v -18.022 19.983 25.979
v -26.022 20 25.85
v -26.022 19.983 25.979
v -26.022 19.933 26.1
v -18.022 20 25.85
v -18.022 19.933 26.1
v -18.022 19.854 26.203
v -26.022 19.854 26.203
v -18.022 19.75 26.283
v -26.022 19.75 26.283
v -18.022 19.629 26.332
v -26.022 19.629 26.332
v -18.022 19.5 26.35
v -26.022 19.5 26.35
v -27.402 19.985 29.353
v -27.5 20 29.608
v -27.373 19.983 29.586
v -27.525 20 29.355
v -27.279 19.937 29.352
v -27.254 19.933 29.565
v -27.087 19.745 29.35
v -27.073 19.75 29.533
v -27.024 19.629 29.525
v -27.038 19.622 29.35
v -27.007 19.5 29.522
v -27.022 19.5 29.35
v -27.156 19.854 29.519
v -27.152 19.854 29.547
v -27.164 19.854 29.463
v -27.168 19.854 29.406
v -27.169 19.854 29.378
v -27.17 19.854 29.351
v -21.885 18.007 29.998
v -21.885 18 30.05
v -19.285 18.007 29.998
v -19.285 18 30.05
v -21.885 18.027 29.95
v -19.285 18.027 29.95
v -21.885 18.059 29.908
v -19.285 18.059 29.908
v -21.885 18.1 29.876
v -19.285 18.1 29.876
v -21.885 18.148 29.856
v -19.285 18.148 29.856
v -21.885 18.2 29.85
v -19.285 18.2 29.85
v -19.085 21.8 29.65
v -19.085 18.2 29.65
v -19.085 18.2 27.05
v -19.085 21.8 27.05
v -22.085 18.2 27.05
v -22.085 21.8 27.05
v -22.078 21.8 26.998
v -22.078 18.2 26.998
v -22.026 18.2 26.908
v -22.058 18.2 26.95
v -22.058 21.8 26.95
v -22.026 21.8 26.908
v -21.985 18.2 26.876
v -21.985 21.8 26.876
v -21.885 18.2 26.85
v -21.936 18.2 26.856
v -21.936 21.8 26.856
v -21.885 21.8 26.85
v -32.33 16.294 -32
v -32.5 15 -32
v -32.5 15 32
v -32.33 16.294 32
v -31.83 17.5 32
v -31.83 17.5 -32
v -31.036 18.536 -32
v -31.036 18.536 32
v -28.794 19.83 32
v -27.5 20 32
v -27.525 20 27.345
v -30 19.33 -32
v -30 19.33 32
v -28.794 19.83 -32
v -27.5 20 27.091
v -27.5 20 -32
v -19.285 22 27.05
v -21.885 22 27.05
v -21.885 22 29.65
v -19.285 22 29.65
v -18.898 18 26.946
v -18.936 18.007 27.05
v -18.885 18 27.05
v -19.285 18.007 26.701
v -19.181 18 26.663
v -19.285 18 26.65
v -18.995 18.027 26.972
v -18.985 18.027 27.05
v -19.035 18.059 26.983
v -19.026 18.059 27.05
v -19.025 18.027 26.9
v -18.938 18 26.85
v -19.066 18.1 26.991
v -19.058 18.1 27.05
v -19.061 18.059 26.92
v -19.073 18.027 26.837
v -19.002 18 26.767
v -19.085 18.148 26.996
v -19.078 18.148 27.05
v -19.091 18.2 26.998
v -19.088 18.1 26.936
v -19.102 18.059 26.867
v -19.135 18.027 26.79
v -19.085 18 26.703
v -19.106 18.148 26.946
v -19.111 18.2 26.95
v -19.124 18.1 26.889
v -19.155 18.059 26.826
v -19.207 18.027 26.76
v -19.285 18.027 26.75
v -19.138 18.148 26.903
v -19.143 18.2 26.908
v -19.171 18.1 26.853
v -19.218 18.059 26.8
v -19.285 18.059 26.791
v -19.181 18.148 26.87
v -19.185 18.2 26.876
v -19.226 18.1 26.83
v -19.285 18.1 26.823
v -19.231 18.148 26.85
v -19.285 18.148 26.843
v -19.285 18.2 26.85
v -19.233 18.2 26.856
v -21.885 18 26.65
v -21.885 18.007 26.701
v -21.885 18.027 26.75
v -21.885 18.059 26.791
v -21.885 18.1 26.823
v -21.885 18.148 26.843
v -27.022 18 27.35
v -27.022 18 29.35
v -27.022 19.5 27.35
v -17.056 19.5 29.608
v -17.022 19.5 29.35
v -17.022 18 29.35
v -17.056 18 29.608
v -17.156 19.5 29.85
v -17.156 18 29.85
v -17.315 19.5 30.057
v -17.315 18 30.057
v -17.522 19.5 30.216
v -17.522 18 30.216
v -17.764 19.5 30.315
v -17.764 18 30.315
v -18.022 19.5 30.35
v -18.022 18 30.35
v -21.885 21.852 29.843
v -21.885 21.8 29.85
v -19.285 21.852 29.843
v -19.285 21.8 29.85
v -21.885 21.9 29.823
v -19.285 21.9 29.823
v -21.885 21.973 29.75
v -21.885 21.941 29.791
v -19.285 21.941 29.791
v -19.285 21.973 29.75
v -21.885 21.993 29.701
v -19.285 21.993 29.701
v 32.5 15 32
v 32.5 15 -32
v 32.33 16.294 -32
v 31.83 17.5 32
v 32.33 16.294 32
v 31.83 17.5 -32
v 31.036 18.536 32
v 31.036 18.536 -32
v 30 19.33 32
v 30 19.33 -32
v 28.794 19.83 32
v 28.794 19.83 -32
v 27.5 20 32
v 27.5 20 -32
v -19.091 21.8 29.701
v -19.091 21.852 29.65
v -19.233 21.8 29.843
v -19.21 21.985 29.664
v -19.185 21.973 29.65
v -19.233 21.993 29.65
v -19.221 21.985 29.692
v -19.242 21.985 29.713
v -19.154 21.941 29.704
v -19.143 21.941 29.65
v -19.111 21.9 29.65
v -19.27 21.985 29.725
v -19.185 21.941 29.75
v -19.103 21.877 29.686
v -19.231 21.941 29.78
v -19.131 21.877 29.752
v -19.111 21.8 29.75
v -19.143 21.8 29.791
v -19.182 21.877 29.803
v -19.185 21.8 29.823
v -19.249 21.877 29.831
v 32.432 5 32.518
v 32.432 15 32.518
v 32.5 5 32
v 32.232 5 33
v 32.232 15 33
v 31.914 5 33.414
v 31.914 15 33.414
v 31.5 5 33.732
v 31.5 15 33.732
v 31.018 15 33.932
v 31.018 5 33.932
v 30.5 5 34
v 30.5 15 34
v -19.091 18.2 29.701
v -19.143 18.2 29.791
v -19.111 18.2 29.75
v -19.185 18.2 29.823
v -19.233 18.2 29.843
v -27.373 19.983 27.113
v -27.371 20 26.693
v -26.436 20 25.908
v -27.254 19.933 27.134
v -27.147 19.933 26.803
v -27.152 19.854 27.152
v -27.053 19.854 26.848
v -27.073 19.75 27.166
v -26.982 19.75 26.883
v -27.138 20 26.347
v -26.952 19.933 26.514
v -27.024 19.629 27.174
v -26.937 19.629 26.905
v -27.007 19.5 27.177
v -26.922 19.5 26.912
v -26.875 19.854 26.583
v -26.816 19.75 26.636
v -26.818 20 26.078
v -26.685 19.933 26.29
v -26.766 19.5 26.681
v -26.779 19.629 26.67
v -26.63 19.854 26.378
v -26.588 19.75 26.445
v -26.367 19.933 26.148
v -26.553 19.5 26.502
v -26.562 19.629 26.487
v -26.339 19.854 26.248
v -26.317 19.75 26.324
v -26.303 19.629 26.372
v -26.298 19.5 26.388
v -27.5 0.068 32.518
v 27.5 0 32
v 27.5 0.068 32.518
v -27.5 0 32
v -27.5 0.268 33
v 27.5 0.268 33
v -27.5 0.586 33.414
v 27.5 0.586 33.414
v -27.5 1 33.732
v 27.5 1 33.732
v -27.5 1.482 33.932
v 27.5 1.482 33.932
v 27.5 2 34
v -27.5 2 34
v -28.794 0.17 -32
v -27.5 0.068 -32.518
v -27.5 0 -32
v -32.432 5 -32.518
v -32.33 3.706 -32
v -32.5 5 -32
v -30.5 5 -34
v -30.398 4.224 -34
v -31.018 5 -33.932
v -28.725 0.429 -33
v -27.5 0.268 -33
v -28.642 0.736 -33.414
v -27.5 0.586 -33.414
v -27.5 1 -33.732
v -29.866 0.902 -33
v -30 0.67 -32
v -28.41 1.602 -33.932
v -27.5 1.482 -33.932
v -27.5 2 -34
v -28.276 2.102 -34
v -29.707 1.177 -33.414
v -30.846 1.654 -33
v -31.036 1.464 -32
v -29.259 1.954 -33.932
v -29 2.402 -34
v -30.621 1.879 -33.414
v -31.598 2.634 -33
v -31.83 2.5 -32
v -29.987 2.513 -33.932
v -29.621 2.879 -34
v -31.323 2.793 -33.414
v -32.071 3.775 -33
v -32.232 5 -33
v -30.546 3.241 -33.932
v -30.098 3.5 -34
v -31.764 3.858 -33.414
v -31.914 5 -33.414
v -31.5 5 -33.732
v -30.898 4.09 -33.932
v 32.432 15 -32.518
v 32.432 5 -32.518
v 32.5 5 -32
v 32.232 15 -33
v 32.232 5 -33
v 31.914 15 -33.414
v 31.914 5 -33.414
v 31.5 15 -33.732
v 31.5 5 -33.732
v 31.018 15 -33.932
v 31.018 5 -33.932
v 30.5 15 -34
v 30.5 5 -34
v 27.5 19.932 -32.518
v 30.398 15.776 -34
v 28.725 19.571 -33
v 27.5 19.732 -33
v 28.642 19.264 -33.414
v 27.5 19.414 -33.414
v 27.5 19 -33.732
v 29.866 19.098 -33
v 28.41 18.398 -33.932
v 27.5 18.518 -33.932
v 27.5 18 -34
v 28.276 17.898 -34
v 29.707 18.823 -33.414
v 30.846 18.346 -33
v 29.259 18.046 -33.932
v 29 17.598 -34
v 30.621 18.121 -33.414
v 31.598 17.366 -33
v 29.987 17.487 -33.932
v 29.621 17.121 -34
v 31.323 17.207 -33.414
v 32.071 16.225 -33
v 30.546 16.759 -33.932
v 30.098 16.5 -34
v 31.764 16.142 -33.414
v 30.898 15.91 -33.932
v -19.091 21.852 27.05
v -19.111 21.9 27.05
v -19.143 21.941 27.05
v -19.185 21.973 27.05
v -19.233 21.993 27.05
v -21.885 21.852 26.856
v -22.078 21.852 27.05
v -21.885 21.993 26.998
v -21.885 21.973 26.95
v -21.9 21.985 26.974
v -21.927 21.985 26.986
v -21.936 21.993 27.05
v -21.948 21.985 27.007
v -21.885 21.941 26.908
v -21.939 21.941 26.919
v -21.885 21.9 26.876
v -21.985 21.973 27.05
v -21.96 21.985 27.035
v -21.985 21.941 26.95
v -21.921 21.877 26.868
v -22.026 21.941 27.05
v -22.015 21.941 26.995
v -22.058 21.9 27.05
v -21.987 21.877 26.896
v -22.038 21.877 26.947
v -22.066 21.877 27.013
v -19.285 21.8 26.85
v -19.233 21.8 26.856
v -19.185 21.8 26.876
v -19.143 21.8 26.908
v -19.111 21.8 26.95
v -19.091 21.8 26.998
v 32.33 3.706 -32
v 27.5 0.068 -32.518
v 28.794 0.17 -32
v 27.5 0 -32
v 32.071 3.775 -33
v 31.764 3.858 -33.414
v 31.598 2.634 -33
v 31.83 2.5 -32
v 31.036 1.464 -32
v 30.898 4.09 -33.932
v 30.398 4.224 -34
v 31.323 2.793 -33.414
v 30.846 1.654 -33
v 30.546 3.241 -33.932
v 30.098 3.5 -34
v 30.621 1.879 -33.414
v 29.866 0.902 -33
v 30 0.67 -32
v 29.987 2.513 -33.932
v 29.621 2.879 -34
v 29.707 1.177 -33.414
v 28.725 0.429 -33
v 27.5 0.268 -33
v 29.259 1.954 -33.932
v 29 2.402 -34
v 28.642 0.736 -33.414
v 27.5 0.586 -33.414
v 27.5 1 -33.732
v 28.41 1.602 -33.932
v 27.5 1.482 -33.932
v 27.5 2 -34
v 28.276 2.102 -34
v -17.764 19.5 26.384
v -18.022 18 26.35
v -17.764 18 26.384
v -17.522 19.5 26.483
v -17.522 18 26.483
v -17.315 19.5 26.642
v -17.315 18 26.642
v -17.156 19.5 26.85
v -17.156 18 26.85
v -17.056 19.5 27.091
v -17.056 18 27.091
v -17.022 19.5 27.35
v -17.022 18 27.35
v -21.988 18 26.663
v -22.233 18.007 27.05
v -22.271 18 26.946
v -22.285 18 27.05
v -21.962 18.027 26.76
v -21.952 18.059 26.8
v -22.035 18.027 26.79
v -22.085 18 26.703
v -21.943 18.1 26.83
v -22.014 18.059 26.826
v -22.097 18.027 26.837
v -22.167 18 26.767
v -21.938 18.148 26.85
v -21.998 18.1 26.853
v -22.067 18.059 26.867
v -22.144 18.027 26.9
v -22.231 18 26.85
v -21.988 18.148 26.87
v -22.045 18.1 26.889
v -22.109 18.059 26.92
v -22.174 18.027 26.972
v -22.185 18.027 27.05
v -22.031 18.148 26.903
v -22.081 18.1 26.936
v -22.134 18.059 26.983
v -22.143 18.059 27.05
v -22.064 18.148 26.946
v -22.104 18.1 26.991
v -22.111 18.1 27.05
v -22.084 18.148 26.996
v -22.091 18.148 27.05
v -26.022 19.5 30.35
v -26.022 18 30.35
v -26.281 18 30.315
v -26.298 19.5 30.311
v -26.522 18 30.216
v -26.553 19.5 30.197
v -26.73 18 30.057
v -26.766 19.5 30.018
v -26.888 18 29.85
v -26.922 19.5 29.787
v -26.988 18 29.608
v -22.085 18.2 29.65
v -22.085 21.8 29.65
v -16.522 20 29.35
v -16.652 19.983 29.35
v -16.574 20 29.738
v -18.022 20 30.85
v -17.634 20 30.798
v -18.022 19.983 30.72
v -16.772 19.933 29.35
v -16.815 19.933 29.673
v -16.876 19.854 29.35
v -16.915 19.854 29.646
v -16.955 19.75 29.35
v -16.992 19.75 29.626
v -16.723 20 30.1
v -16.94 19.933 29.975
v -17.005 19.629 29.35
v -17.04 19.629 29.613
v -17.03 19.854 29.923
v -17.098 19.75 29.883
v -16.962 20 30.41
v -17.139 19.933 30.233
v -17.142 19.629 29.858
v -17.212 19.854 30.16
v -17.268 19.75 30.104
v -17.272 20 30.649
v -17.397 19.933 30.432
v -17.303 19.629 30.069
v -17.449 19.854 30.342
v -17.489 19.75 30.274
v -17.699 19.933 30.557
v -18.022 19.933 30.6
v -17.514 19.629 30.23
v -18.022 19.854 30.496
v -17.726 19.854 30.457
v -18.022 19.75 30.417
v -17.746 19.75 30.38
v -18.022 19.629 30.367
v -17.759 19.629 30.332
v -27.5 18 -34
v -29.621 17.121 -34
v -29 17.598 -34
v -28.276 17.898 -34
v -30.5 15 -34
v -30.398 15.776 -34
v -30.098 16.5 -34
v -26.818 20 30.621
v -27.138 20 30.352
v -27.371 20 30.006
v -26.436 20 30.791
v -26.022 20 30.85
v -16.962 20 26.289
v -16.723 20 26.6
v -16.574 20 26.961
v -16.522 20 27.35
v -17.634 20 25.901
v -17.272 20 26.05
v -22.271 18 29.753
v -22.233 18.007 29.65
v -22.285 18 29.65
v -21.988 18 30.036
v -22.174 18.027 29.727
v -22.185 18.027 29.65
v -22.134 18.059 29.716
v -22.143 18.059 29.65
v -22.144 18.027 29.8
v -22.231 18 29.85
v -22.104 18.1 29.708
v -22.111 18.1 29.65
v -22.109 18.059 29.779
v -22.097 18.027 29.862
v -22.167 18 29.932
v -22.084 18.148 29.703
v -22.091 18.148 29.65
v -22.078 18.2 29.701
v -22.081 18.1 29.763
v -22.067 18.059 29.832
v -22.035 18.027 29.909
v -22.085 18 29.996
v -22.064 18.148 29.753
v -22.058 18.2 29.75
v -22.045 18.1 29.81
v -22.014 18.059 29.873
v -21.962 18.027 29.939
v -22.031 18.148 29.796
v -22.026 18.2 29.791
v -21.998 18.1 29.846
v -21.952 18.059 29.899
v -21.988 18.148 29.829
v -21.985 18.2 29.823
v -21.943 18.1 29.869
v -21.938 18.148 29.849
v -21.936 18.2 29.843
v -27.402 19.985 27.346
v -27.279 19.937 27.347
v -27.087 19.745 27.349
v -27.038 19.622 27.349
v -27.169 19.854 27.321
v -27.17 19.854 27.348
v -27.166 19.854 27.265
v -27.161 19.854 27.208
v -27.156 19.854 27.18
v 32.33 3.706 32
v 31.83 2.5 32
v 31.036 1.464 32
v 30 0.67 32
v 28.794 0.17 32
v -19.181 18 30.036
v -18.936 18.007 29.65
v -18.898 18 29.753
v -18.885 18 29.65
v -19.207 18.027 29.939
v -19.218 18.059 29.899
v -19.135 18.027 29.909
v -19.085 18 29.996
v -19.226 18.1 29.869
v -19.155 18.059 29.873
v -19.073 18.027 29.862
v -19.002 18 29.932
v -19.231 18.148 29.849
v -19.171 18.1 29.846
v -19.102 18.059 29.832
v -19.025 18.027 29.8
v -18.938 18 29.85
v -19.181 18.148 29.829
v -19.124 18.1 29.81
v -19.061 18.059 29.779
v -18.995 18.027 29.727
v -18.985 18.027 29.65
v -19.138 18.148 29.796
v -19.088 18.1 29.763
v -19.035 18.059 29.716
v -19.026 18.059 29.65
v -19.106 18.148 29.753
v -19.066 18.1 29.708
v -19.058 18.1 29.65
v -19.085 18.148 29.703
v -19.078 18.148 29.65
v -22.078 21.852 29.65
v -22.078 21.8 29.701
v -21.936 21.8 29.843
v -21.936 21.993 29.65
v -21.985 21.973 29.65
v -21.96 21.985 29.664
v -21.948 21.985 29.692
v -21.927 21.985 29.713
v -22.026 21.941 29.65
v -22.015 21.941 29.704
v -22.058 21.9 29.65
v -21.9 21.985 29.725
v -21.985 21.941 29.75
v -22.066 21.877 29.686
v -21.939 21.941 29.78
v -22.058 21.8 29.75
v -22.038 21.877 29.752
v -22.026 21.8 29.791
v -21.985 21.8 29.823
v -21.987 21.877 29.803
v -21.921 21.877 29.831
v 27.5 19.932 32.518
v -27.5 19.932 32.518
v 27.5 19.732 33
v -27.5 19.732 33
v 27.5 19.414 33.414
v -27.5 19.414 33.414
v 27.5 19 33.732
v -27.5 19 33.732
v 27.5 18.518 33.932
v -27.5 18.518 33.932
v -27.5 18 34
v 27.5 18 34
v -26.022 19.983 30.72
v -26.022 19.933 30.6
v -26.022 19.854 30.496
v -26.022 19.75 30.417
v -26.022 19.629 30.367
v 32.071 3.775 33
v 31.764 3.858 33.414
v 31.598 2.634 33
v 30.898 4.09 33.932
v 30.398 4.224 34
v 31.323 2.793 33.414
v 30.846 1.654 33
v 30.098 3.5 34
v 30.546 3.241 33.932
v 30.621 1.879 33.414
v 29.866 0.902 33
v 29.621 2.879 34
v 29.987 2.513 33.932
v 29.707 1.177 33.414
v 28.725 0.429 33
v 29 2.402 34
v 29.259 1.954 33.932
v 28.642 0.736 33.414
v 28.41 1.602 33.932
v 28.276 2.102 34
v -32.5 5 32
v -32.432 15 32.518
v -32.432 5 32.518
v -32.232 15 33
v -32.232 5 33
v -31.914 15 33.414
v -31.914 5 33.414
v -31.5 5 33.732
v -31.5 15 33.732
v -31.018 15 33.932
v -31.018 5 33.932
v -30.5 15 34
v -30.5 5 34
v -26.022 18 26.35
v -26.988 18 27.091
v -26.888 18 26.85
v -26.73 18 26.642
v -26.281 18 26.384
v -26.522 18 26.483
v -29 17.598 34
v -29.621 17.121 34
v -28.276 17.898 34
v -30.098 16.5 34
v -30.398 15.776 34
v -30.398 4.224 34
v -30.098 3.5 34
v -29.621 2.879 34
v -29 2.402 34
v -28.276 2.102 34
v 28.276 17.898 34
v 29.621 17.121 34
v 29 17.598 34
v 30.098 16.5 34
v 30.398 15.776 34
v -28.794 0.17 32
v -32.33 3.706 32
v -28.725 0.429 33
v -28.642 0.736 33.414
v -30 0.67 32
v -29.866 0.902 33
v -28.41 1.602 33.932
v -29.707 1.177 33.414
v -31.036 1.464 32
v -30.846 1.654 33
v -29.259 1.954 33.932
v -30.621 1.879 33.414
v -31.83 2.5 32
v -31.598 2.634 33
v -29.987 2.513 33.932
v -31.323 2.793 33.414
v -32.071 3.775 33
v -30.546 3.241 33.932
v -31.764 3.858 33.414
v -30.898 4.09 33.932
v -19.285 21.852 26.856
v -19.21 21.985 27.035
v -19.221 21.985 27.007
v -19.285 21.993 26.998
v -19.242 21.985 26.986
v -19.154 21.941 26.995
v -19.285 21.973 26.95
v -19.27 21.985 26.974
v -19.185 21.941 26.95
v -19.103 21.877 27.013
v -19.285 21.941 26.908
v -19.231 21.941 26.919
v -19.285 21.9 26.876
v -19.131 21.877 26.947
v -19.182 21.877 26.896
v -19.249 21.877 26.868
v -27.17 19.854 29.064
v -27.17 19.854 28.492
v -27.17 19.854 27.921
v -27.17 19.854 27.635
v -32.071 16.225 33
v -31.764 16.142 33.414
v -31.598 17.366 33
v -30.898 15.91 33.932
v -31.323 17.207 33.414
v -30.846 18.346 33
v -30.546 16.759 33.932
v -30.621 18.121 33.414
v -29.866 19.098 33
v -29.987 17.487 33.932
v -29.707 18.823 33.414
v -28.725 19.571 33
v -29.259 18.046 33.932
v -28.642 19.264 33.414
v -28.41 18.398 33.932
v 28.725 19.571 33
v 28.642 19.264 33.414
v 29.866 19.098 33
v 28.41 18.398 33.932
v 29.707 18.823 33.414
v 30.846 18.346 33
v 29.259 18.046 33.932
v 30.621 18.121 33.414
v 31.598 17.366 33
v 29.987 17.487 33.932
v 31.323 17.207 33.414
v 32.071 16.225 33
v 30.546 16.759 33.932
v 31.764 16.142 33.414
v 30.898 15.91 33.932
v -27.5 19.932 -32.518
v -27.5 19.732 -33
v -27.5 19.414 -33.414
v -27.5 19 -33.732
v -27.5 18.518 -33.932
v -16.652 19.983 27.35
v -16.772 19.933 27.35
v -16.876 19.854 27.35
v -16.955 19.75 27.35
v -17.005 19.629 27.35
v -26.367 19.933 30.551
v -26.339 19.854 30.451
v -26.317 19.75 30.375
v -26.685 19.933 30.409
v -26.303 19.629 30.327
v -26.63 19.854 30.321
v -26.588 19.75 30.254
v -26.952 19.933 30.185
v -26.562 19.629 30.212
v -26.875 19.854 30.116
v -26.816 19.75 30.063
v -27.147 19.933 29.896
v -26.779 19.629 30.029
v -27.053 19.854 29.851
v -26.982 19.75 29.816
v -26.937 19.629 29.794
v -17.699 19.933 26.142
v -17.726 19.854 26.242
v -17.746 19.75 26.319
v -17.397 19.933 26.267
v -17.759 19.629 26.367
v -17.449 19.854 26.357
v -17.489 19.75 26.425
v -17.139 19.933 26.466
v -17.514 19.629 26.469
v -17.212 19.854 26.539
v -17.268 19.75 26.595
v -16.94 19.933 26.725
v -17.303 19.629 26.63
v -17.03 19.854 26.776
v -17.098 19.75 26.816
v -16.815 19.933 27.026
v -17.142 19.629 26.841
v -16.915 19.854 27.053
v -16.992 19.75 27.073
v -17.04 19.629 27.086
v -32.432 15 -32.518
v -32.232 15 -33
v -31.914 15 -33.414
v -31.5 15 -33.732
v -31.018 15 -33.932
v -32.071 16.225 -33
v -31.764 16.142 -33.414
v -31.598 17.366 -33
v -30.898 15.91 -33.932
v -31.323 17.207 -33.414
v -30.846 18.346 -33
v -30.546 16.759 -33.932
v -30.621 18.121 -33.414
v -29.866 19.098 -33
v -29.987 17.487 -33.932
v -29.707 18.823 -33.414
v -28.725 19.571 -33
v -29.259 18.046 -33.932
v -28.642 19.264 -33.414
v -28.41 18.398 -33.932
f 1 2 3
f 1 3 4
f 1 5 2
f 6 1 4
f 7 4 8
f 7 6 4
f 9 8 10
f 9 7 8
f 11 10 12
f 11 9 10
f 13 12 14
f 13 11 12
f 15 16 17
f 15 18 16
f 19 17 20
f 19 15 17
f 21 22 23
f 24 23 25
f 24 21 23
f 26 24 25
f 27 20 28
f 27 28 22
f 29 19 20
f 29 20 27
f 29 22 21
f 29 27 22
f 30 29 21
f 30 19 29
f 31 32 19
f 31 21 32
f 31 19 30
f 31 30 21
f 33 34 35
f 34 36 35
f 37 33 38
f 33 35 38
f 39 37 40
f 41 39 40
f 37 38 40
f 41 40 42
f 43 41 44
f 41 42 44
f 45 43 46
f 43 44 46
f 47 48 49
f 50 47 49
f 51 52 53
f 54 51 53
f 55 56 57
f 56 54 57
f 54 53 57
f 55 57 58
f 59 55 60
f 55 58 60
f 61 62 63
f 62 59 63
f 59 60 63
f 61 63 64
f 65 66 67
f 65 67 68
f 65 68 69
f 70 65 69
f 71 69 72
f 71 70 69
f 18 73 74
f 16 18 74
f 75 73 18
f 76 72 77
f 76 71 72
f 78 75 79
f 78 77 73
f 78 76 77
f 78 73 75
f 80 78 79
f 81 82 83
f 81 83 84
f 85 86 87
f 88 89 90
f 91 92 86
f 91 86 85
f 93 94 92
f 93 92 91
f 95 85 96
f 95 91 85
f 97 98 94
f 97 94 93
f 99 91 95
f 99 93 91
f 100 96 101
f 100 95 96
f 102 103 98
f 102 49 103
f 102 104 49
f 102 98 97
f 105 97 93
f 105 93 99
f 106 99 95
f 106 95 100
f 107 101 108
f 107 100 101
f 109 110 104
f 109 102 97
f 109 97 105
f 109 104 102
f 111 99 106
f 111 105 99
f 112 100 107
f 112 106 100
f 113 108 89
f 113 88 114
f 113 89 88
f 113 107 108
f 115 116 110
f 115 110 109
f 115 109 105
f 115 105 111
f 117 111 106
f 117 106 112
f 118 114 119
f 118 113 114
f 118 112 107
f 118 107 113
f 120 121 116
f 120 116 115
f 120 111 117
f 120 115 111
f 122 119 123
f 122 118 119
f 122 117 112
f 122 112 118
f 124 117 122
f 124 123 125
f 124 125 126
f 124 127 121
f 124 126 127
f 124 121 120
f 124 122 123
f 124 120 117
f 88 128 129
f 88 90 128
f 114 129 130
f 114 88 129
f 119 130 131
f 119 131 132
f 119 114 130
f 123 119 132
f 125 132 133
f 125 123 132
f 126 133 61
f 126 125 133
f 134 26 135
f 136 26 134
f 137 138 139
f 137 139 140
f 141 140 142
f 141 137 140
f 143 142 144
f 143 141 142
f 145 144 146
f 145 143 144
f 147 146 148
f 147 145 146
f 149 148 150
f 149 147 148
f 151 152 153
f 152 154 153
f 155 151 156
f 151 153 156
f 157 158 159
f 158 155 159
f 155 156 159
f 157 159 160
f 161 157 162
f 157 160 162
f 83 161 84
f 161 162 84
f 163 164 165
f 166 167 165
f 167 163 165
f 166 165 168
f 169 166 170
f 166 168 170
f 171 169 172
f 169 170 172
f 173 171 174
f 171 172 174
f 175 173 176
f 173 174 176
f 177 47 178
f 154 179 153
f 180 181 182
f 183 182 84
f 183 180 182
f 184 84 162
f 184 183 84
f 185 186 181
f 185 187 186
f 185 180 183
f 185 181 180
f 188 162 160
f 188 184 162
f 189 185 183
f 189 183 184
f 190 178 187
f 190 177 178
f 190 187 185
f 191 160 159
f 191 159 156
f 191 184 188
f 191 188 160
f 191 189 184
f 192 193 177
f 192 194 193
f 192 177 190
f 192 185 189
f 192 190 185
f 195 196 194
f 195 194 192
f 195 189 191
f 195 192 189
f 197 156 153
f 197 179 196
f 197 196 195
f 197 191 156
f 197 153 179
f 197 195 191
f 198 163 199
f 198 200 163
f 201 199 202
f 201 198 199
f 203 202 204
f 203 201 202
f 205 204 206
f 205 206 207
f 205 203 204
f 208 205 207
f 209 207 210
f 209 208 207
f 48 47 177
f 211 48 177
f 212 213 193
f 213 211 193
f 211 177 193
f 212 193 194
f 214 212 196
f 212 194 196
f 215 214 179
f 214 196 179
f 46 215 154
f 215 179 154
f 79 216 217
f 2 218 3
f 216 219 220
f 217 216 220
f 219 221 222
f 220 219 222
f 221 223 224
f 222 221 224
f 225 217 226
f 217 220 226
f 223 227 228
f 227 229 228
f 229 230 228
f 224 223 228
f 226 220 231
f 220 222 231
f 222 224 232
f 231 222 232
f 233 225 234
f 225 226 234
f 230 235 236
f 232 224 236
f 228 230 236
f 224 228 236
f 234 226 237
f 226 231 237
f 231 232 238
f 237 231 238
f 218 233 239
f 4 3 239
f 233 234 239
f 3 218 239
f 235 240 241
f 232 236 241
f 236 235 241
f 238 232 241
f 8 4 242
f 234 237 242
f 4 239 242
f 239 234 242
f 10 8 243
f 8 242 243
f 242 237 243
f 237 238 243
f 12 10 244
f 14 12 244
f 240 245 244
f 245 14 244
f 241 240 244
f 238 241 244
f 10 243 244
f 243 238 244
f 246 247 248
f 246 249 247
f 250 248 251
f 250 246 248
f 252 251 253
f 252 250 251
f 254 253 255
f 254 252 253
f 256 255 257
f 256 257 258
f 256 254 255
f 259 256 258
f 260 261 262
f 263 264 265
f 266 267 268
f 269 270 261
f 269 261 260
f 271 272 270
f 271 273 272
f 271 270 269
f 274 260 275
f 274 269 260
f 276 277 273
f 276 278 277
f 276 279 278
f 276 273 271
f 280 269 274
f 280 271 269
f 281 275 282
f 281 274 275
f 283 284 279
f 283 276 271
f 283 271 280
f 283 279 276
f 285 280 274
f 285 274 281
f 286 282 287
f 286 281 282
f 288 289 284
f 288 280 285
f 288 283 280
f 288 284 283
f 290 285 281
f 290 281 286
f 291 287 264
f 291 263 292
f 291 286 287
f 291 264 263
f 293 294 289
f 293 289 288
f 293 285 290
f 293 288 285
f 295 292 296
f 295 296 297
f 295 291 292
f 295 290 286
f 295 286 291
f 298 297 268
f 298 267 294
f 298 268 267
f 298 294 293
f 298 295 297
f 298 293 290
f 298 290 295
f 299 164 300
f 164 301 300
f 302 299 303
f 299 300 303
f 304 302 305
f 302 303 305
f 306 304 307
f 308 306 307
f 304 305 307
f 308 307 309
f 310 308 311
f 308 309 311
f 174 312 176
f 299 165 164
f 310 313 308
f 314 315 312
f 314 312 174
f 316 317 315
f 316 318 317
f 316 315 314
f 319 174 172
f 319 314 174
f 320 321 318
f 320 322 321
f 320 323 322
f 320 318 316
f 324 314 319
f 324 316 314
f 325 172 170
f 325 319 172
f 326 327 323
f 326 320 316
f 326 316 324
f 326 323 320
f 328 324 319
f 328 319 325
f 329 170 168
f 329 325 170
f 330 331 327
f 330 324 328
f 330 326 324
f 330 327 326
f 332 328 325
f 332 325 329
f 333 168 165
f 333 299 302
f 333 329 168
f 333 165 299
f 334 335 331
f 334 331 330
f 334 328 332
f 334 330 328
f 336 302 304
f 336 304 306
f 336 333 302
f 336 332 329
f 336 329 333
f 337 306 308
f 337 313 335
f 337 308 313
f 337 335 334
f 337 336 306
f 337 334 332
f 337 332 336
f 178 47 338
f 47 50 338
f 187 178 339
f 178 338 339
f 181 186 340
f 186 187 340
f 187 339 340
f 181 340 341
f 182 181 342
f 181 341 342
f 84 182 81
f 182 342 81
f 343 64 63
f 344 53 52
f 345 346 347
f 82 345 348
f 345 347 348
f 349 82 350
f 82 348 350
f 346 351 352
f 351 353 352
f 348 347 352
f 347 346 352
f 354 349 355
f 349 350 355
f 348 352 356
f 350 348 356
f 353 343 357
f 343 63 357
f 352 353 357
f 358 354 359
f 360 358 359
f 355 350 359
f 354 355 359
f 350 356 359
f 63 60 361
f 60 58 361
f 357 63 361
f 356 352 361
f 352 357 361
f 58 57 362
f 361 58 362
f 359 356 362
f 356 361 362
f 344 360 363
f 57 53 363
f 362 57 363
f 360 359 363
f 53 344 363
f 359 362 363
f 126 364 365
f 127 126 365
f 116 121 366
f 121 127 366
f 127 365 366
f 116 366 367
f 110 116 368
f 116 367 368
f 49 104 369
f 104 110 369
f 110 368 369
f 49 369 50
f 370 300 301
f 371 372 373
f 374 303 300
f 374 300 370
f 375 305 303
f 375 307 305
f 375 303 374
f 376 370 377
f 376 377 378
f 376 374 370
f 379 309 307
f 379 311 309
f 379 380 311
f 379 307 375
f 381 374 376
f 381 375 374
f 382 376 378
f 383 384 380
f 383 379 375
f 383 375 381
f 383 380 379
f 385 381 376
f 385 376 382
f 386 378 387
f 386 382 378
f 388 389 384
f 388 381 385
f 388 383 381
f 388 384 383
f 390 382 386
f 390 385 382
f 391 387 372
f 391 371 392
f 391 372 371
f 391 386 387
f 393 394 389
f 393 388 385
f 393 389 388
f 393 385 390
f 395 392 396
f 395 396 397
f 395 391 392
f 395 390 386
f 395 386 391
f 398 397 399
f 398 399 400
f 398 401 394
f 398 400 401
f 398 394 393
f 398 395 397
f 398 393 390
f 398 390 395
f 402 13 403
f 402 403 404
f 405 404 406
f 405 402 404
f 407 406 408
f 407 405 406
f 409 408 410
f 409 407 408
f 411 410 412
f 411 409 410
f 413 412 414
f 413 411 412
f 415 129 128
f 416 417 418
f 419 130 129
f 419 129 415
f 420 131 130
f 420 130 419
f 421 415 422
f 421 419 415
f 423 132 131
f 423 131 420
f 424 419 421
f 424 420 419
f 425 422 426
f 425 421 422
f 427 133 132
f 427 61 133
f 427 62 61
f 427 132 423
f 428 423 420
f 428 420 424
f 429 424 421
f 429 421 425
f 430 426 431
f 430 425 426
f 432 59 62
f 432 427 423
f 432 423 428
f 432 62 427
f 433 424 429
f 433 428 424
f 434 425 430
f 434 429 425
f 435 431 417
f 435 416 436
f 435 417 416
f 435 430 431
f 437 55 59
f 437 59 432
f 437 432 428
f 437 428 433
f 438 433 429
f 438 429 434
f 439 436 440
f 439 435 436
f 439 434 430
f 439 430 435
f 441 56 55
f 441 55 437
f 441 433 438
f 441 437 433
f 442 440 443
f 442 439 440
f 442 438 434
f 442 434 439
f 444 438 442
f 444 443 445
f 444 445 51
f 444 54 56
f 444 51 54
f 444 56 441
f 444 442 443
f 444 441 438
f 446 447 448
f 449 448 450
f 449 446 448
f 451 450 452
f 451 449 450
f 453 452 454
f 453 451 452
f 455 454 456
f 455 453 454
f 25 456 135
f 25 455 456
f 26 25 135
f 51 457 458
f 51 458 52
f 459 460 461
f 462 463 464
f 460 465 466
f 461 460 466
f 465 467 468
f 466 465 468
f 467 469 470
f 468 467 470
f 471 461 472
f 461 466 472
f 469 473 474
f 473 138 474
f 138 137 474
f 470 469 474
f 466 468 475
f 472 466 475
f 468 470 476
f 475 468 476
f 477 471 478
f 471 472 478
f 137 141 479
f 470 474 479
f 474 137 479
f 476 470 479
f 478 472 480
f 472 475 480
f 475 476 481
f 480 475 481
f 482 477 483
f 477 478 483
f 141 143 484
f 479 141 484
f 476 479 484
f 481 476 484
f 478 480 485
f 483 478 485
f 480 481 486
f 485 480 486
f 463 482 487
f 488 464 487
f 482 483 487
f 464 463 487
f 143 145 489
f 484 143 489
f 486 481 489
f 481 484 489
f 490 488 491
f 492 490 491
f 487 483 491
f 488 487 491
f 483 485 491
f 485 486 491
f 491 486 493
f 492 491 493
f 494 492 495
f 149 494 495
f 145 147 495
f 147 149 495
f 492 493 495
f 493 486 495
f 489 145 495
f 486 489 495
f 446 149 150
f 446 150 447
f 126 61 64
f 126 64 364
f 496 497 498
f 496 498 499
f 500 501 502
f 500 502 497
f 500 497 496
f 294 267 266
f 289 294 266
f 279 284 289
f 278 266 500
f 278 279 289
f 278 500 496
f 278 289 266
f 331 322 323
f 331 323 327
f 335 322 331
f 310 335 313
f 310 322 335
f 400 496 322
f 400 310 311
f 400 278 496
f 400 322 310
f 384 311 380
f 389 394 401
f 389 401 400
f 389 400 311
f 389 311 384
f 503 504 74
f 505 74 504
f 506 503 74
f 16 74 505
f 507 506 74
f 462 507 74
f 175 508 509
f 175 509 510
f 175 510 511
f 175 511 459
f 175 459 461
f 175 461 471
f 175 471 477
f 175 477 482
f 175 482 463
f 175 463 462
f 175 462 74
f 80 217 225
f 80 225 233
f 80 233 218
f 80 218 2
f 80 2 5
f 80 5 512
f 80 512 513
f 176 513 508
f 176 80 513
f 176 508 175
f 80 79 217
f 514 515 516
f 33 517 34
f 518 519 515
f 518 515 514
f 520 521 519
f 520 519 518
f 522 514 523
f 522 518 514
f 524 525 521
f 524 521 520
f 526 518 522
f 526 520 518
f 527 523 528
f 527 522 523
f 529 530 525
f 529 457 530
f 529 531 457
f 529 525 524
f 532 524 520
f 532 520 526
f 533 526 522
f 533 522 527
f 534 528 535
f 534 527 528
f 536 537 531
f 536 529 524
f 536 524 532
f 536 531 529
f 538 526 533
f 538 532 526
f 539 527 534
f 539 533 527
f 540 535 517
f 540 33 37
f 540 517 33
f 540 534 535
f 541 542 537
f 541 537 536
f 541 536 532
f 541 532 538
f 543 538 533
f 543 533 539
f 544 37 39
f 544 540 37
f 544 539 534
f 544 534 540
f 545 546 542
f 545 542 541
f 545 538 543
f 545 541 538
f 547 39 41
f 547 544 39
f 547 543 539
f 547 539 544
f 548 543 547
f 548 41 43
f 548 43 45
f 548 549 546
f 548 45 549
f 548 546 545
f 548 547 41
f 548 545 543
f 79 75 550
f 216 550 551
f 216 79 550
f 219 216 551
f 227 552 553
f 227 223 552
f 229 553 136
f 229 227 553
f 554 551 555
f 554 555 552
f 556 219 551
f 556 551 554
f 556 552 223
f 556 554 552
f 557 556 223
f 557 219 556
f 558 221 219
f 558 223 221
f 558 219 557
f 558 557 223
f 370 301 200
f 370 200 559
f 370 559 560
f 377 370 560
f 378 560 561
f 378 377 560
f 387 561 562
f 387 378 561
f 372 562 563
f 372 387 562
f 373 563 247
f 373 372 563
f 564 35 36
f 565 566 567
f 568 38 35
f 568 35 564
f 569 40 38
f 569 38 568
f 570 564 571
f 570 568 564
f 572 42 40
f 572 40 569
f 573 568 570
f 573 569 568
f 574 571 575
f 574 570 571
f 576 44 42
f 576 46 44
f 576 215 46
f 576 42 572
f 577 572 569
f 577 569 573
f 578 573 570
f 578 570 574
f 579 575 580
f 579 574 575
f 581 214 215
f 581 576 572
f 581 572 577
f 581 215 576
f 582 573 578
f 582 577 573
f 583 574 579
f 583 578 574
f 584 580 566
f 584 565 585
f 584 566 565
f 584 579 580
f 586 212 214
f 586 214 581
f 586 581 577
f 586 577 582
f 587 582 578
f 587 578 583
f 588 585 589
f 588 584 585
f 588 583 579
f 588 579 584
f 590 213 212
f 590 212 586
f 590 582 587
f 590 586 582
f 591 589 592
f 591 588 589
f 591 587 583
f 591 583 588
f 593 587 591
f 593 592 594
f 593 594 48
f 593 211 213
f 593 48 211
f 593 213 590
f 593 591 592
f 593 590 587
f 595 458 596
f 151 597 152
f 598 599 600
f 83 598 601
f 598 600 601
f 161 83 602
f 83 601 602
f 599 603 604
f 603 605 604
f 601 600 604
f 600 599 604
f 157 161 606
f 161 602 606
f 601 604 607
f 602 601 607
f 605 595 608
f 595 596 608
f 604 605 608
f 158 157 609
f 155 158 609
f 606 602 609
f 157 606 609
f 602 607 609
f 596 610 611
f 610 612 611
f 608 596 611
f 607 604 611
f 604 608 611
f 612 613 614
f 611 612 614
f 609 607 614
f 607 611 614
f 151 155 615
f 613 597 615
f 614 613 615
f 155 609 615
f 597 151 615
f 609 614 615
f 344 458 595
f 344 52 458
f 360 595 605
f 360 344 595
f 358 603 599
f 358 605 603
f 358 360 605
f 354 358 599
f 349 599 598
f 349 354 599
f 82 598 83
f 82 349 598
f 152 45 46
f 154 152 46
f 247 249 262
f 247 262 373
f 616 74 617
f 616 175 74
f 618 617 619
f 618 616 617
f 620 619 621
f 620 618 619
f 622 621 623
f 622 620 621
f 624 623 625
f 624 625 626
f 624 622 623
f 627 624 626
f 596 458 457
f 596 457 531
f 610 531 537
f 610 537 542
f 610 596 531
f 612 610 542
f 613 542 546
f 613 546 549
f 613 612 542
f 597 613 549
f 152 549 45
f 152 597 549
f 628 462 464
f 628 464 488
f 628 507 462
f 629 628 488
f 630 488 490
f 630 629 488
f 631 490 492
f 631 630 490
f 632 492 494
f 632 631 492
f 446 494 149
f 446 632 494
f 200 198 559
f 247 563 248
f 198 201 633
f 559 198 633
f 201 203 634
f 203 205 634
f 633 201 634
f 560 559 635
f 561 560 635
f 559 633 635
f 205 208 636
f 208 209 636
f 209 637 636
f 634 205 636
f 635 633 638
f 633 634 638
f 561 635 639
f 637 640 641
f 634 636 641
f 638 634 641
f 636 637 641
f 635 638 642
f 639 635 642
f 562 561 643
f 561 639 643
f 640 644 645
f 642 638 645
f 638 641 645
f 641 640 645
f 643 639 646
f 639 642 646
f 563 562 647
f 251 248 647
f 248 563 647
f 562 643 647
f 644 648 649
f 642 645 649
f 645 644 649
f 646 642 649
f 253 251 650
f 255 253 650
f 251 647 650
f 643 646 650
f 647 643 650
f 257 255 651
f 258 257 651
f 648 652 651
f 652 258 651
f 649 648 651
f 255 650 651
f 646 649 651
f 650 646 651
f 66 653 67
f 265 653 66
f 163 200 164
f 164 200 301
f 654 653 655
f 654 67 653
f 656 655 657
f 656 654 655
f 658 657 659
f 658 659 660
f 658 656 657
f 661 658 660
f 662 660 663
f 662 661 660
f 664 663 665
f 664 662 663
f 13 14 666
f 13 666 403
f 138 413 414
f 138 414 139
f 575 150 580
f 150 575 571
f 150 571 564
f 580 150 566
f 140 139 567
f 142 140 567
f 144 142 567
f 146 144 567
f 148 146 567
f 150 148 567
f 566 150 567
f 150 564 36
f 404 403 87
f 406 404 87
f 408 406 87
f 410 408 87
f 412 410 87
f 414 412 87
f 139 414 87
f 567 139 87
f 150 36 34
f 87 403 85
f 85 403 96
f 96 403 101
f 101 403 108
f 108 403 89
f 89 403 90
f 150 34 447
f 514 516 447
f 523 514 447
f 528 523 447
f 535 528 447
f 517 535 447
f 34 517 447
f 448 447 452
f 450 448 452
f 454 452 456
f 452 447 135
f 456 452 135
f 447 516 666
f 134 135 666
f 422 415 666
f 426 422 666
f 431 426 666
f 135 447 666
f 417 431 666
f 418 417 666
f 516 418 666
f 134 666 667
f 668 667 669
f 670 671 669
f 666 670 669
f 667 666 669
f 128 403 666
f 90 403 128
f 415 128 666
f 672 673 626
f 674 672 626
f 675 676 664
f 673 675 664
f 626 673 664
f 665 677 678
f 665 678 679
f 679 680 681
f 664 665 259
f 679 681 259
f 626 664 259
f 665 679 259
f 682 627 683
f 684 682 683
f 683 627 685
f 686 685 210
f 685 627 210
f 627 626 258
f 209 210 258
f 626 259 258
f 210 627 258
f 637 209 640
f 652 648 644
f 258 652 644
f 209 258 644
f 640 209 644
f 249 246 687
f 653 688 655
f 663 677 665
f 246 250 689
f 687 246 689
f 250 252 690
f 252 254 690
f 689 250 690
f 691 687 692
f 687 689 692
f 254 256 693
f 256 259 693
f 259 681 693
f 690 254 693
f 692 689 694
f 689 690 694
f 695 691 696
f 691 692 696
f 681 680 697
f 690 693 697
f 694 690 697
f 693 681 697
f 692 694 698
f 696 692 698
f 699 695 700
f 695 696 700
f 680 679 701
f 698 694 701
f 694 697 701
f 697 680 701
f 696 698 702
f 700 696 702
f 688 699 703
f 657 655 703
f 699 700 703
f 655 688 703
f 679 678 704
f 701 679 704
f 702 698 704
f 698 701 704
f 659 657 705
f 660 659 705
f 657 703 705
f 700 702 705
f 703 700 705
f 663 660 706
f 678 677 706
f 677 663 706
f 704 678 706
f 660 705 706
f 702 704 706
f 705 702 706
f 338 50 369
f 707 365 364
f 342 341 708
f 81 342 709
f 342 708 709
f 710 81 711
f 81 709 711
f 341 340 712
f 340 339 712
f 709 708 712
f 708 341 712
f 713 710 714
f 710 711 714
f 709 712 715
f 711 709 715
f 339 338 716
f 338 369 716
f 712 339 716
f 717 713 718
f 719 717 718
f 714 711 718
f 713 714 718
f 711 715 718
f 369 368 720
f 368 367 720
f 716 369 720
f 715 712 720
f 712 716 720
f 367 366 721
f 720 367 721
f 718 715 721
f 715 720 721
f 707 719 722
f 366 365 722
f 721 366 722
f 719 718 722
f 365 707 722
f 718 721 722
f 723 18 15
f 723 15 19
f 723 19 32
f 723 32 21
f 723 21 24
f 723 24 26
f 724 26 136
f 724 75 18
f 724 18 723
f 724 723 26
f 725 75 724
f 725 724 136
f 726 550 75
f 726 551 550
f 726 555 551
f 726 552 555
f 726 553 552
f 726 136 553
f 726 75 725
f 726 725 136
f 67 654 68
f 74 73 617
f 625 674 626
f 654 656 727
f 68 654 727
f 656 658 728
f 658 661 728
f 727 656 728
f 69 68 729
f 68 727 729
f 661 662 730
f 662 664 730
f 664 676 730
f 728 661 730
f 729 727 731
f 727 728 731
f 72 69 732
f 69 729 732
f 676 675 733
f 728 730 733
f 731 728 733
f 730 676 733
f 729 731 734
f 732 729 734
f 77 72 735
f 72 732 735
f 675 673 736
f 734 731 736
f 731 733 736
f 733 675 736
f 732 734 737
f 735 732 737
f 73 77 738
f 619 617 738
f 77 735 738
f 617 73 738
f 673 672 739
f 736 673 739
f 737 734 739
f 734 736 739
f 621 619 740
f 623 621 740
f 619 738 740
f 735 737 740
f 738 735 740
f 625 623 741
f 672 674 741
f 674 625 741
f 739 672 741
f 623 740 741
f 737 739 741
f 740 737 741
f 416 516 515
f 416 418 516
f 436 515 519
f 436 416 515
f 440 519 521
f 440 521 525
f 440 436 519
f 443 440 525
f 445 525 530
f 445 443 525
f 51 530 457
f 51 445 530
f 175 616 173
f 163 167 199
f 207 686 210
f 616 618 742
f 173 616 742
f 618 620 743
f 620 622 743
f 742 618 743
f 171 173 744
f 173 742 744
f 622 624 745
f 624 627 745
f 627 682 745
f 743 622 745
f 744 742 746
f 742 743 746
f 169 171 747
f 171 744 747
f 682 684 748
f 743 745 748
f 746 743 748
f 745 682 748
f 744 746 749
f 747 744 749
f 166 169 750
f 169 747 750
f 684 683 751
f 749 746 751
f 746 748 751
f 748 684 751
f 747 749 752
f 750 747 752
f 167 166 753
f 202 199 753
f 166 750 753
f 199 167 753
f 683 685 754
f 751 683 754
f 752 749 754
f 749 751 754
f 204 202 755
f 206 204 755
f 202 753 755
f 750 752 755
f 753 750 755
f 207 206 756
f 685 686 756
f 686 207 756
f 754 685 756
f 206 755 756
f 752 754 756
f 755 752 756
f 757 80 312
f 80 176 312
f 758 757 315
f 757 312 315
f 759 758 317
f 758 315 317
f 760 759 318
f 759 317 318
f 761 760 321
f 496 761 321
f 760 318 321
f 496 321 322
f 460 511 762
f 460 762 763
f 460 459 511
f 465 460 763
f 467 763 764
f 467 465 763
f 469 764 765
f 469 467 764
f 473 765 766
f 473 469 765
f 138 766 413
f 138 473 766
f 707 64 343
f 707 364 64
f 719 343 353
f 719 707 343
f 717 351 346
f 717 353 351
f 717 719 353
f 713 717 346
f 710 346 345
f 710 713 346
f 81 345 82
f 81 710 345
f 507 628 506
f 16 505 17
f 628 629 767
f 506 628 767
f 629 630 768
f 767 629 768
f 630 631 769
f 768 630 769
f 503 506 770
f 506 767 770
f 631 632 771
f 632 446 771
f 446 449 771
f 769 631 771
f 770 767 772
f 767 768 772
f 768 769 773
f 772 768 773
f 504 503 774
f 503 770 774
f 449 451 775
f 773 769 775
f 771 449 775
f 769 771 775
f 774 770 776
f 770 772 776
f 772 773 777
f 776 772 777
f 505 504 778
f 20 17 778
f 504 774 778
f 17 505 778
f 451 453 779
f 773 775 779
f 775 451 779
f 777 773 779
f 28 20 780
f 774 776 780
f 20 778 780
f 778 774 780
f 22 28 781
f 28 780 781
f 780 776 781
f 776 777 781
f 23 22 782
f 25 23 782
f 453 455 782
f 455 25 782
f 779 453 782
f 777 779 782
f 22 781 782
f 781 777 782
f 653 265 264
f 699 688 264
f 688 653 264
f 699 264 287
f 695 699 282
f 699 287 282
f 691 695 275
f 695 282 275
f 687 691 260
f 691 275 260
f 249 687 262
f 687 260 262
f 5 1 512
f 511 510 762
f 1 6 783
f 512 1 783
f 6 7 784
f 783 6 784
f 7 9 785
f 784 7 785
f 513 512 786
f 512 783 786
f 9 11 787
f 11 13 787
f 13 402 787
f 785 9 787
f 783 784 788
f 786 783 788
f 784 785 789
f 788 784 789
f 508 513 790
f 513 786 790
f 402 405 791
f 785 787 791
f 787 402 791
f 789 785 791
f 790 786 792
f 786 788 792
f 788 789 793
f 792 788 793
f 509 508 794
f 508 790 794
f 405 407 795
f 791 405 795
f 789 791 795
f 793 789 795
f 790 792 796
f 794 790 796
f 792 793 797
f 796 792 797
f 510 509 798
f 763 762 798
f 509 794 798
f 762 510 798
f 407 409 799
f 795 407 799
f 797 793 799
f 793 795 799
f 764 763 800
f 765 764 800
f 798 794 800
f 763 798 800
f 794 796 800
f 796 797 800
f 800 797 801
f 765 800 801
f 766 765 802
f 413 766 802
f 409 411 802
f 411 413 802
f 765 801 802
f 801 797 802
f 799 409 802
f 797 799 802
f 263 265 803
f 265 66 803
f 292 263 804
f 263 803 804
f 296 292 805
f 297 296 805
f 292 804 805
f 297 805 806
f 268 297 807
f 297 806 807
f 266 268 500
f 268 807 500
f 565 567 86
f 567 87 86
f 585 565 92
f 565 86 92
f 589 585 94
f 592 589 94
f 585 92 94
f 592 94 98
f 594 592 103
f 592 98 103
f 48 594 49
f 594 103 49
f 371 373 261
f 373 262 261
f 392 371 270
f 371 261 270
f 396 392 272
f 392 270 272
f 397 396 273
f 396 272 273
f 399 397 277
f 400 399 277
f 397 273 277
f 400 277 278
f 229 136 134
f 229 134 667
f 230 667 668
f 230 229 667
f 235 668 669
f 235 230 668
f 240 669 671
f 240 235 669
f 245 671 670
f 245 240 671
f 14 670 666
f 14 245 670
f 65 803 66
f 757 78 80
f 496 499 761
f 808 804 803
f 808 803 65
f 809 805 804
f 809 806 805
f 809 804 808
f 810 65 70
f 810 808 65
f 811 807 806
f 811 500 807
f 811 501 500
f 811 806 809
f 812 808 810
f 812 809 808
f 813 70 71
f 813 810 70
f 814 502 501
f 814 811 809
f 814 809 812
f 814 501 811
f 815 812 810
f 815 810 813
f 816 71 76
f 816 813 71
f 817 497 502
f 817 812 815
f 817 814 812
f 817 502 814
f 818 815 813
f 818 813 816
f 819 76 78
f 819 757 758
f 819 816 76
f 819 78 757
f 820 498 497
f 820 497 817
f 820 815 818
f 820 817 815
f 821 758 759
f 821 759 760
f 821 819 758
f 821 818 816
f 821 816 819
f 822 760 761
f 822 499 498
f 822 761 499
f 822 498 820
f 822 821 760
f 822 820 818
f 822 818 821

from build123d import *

# Parameters (mm, degrees)
SKETCH1_W           = 65
SKETCH1_H           = 68
BOSS_EXTRUDE1_DEPTH = 20
FILLET1_R           = 5
FILLET2_R           = 2
CUT_EXTRUDE1_DEPTH  = 2
FILLET3_R           = 0.5
SKETCH3_W           = 3
SKETCH3_H           = 3
BOSS_EXTRUDE2_DEPTH = 4
FILLET4_R           = 0.2


with BuildPart() as part:
    # Sketch1 → Boss-Extrude1 (new body)
    with BuildSketch(Plane(origin=(0, 0, 0), x_dir=(1, 0, 0), z_dir=(0, 1, 0))):
        Rectangle(SKETCH1_W, SKETCH1_H)
    extrude(amount=BOSS_EXTRUDE1_DEPTH)

    # Fillet1
    fillet1_edges = [part.edges().sort_by_distance(p)[0] for p in [
        (-32.5, 20, 0),
        (32.5, 20, 0),
        (-32.5, 0, 0),
        (32.5, 0, 0),
    ]]
    fillet(fillet1_edges, radius=FILLET1_R)

    # Fillet2
    fillet2_edges = [part.edges().sort_by_distance(p)[0] for p in [
        (-32.5, 10, 34),
        (-32.5, 10, -34),
        (0, 0, 34),
        (32.5, 10, 34),
        (0, 20, 34),
        (31.035533906, 18.535533906, 34),
        (31.035533906, 1.464466094, 34),
        (-31.035533906, 18.535533906, 34),
        (-31.035533906, 1.464466094, 34),
        (0, 0, -34),
        (0, 20, -34),
        (32.5, 10, -34),
        (31.035533906, 18.535533906, -34),
        (31.035533906, 1.464466094, -34),
        (-31.035533906, 18.535533906, -34),
        (-31.035533906, 1.464466094, -34),
    ]]
    fillet(fillet2_edges, radius=FILLET2_R)

    # Sketch2 → Cut-Extrude1 (cut)
    with BuildSketch(Plane(origin=(0, 20, 0), x_dir=(1, 0, 0), z_dir=(0, 1, 0))):
        with BuildLine():
            Line((-26.022422588, -26.349516296), (-18.022422588, -26.349516296))
            ThreePointArc((-18.022422588, -26.349516296), (-17.315315807, -26.642409515), (-17.022422588, -27.349516296))
            Line((-17.022422588, -27.349516296), (-17.022422588, -29.349516296))
            ThreePointArc((-17.022422588, -29.349516296), (-17.315315807, -30.056623077), (-18.022422588, -30.349516296))
            Line((-18.022422588, -30.349516296), (-26.022422588, -30.349516296))
            ThreePointArc((-26.022422588, -30.349516296), (-26.729529369, -30.056623077), (-27.022422588, -29.349516296))
            Line((-27.022422588, -29.349516296), (-27.022422588, -27.349516296))
            ThreePointArc((-27.022422588, -27.349516296), (-26.729529369, -26.642409515), (-26.022422588, -26.349516296))
        make_face()
    extrude(amount=-CUT_EXTRUDE1_DEPTH, mode=Mode.SUBTRACT)

    # Fillet3
    fillet3_edges = [part.edges().sort_by_distance(p)[0] for p in [
        (-26.729529369, 20, 26.642409515),
        (-27.022422588, 20, 28.349516296),
        (-26.729529369, 20, 30.056623077),
        (-22.022422588, 20, 30.349516296),
        (-17.315315807, 20, 30.056623077),
        (-17.022422588, 20, 28.349516296),
        (-17.315315807, 20, 26.642409515),
        (-22.022422588, 20, 26.349516296),
    ]]
    fillet(fillet3_edges, radius=FILLET3_R)

    # Sketch3 → Boss-Extrude2 (add)
    with BuildSketch(Plane(origin=(0, 18, 0), x_dir=(1, 0, 0), z_dir=(0, 1, 0))):
        with Locations((-20.584643458, -28.349516296)):
            Rectangle(SKETCH3_W, SKETCH3_H)
    extrude(amount=BOSS_EXTRUDE2_DEPTH)

    # Fillet4
    fillet4_edges = [part.edges().sort_by_distance(p)[0] for p in [
        (-19.084643458, 18, 28.349516296),
        (-19.084643458, 20, 29.849516296),
        (-20.584643458, 18, 26.849516296),
        (-19.084643458, 20, 26.849516296),
        (-22.084643458, 18, 28.349516296),
        (-22.084643458, 20, 26.849516296),
        (-20.584643458, 18, 29.849516296),
        (-22.084643458, 20, 29.849516296),
        (-19.084643458, 22, 28.349516296),
        (-20.584643458, 22, 26.849516296),
        (-22.084643458, 22, 28.349516296),
        (-20.584643458, 22, 29.849516296),
    ]]
    fillet(fillet4_edges, radius=FILLET4_R)


solid = part.part
